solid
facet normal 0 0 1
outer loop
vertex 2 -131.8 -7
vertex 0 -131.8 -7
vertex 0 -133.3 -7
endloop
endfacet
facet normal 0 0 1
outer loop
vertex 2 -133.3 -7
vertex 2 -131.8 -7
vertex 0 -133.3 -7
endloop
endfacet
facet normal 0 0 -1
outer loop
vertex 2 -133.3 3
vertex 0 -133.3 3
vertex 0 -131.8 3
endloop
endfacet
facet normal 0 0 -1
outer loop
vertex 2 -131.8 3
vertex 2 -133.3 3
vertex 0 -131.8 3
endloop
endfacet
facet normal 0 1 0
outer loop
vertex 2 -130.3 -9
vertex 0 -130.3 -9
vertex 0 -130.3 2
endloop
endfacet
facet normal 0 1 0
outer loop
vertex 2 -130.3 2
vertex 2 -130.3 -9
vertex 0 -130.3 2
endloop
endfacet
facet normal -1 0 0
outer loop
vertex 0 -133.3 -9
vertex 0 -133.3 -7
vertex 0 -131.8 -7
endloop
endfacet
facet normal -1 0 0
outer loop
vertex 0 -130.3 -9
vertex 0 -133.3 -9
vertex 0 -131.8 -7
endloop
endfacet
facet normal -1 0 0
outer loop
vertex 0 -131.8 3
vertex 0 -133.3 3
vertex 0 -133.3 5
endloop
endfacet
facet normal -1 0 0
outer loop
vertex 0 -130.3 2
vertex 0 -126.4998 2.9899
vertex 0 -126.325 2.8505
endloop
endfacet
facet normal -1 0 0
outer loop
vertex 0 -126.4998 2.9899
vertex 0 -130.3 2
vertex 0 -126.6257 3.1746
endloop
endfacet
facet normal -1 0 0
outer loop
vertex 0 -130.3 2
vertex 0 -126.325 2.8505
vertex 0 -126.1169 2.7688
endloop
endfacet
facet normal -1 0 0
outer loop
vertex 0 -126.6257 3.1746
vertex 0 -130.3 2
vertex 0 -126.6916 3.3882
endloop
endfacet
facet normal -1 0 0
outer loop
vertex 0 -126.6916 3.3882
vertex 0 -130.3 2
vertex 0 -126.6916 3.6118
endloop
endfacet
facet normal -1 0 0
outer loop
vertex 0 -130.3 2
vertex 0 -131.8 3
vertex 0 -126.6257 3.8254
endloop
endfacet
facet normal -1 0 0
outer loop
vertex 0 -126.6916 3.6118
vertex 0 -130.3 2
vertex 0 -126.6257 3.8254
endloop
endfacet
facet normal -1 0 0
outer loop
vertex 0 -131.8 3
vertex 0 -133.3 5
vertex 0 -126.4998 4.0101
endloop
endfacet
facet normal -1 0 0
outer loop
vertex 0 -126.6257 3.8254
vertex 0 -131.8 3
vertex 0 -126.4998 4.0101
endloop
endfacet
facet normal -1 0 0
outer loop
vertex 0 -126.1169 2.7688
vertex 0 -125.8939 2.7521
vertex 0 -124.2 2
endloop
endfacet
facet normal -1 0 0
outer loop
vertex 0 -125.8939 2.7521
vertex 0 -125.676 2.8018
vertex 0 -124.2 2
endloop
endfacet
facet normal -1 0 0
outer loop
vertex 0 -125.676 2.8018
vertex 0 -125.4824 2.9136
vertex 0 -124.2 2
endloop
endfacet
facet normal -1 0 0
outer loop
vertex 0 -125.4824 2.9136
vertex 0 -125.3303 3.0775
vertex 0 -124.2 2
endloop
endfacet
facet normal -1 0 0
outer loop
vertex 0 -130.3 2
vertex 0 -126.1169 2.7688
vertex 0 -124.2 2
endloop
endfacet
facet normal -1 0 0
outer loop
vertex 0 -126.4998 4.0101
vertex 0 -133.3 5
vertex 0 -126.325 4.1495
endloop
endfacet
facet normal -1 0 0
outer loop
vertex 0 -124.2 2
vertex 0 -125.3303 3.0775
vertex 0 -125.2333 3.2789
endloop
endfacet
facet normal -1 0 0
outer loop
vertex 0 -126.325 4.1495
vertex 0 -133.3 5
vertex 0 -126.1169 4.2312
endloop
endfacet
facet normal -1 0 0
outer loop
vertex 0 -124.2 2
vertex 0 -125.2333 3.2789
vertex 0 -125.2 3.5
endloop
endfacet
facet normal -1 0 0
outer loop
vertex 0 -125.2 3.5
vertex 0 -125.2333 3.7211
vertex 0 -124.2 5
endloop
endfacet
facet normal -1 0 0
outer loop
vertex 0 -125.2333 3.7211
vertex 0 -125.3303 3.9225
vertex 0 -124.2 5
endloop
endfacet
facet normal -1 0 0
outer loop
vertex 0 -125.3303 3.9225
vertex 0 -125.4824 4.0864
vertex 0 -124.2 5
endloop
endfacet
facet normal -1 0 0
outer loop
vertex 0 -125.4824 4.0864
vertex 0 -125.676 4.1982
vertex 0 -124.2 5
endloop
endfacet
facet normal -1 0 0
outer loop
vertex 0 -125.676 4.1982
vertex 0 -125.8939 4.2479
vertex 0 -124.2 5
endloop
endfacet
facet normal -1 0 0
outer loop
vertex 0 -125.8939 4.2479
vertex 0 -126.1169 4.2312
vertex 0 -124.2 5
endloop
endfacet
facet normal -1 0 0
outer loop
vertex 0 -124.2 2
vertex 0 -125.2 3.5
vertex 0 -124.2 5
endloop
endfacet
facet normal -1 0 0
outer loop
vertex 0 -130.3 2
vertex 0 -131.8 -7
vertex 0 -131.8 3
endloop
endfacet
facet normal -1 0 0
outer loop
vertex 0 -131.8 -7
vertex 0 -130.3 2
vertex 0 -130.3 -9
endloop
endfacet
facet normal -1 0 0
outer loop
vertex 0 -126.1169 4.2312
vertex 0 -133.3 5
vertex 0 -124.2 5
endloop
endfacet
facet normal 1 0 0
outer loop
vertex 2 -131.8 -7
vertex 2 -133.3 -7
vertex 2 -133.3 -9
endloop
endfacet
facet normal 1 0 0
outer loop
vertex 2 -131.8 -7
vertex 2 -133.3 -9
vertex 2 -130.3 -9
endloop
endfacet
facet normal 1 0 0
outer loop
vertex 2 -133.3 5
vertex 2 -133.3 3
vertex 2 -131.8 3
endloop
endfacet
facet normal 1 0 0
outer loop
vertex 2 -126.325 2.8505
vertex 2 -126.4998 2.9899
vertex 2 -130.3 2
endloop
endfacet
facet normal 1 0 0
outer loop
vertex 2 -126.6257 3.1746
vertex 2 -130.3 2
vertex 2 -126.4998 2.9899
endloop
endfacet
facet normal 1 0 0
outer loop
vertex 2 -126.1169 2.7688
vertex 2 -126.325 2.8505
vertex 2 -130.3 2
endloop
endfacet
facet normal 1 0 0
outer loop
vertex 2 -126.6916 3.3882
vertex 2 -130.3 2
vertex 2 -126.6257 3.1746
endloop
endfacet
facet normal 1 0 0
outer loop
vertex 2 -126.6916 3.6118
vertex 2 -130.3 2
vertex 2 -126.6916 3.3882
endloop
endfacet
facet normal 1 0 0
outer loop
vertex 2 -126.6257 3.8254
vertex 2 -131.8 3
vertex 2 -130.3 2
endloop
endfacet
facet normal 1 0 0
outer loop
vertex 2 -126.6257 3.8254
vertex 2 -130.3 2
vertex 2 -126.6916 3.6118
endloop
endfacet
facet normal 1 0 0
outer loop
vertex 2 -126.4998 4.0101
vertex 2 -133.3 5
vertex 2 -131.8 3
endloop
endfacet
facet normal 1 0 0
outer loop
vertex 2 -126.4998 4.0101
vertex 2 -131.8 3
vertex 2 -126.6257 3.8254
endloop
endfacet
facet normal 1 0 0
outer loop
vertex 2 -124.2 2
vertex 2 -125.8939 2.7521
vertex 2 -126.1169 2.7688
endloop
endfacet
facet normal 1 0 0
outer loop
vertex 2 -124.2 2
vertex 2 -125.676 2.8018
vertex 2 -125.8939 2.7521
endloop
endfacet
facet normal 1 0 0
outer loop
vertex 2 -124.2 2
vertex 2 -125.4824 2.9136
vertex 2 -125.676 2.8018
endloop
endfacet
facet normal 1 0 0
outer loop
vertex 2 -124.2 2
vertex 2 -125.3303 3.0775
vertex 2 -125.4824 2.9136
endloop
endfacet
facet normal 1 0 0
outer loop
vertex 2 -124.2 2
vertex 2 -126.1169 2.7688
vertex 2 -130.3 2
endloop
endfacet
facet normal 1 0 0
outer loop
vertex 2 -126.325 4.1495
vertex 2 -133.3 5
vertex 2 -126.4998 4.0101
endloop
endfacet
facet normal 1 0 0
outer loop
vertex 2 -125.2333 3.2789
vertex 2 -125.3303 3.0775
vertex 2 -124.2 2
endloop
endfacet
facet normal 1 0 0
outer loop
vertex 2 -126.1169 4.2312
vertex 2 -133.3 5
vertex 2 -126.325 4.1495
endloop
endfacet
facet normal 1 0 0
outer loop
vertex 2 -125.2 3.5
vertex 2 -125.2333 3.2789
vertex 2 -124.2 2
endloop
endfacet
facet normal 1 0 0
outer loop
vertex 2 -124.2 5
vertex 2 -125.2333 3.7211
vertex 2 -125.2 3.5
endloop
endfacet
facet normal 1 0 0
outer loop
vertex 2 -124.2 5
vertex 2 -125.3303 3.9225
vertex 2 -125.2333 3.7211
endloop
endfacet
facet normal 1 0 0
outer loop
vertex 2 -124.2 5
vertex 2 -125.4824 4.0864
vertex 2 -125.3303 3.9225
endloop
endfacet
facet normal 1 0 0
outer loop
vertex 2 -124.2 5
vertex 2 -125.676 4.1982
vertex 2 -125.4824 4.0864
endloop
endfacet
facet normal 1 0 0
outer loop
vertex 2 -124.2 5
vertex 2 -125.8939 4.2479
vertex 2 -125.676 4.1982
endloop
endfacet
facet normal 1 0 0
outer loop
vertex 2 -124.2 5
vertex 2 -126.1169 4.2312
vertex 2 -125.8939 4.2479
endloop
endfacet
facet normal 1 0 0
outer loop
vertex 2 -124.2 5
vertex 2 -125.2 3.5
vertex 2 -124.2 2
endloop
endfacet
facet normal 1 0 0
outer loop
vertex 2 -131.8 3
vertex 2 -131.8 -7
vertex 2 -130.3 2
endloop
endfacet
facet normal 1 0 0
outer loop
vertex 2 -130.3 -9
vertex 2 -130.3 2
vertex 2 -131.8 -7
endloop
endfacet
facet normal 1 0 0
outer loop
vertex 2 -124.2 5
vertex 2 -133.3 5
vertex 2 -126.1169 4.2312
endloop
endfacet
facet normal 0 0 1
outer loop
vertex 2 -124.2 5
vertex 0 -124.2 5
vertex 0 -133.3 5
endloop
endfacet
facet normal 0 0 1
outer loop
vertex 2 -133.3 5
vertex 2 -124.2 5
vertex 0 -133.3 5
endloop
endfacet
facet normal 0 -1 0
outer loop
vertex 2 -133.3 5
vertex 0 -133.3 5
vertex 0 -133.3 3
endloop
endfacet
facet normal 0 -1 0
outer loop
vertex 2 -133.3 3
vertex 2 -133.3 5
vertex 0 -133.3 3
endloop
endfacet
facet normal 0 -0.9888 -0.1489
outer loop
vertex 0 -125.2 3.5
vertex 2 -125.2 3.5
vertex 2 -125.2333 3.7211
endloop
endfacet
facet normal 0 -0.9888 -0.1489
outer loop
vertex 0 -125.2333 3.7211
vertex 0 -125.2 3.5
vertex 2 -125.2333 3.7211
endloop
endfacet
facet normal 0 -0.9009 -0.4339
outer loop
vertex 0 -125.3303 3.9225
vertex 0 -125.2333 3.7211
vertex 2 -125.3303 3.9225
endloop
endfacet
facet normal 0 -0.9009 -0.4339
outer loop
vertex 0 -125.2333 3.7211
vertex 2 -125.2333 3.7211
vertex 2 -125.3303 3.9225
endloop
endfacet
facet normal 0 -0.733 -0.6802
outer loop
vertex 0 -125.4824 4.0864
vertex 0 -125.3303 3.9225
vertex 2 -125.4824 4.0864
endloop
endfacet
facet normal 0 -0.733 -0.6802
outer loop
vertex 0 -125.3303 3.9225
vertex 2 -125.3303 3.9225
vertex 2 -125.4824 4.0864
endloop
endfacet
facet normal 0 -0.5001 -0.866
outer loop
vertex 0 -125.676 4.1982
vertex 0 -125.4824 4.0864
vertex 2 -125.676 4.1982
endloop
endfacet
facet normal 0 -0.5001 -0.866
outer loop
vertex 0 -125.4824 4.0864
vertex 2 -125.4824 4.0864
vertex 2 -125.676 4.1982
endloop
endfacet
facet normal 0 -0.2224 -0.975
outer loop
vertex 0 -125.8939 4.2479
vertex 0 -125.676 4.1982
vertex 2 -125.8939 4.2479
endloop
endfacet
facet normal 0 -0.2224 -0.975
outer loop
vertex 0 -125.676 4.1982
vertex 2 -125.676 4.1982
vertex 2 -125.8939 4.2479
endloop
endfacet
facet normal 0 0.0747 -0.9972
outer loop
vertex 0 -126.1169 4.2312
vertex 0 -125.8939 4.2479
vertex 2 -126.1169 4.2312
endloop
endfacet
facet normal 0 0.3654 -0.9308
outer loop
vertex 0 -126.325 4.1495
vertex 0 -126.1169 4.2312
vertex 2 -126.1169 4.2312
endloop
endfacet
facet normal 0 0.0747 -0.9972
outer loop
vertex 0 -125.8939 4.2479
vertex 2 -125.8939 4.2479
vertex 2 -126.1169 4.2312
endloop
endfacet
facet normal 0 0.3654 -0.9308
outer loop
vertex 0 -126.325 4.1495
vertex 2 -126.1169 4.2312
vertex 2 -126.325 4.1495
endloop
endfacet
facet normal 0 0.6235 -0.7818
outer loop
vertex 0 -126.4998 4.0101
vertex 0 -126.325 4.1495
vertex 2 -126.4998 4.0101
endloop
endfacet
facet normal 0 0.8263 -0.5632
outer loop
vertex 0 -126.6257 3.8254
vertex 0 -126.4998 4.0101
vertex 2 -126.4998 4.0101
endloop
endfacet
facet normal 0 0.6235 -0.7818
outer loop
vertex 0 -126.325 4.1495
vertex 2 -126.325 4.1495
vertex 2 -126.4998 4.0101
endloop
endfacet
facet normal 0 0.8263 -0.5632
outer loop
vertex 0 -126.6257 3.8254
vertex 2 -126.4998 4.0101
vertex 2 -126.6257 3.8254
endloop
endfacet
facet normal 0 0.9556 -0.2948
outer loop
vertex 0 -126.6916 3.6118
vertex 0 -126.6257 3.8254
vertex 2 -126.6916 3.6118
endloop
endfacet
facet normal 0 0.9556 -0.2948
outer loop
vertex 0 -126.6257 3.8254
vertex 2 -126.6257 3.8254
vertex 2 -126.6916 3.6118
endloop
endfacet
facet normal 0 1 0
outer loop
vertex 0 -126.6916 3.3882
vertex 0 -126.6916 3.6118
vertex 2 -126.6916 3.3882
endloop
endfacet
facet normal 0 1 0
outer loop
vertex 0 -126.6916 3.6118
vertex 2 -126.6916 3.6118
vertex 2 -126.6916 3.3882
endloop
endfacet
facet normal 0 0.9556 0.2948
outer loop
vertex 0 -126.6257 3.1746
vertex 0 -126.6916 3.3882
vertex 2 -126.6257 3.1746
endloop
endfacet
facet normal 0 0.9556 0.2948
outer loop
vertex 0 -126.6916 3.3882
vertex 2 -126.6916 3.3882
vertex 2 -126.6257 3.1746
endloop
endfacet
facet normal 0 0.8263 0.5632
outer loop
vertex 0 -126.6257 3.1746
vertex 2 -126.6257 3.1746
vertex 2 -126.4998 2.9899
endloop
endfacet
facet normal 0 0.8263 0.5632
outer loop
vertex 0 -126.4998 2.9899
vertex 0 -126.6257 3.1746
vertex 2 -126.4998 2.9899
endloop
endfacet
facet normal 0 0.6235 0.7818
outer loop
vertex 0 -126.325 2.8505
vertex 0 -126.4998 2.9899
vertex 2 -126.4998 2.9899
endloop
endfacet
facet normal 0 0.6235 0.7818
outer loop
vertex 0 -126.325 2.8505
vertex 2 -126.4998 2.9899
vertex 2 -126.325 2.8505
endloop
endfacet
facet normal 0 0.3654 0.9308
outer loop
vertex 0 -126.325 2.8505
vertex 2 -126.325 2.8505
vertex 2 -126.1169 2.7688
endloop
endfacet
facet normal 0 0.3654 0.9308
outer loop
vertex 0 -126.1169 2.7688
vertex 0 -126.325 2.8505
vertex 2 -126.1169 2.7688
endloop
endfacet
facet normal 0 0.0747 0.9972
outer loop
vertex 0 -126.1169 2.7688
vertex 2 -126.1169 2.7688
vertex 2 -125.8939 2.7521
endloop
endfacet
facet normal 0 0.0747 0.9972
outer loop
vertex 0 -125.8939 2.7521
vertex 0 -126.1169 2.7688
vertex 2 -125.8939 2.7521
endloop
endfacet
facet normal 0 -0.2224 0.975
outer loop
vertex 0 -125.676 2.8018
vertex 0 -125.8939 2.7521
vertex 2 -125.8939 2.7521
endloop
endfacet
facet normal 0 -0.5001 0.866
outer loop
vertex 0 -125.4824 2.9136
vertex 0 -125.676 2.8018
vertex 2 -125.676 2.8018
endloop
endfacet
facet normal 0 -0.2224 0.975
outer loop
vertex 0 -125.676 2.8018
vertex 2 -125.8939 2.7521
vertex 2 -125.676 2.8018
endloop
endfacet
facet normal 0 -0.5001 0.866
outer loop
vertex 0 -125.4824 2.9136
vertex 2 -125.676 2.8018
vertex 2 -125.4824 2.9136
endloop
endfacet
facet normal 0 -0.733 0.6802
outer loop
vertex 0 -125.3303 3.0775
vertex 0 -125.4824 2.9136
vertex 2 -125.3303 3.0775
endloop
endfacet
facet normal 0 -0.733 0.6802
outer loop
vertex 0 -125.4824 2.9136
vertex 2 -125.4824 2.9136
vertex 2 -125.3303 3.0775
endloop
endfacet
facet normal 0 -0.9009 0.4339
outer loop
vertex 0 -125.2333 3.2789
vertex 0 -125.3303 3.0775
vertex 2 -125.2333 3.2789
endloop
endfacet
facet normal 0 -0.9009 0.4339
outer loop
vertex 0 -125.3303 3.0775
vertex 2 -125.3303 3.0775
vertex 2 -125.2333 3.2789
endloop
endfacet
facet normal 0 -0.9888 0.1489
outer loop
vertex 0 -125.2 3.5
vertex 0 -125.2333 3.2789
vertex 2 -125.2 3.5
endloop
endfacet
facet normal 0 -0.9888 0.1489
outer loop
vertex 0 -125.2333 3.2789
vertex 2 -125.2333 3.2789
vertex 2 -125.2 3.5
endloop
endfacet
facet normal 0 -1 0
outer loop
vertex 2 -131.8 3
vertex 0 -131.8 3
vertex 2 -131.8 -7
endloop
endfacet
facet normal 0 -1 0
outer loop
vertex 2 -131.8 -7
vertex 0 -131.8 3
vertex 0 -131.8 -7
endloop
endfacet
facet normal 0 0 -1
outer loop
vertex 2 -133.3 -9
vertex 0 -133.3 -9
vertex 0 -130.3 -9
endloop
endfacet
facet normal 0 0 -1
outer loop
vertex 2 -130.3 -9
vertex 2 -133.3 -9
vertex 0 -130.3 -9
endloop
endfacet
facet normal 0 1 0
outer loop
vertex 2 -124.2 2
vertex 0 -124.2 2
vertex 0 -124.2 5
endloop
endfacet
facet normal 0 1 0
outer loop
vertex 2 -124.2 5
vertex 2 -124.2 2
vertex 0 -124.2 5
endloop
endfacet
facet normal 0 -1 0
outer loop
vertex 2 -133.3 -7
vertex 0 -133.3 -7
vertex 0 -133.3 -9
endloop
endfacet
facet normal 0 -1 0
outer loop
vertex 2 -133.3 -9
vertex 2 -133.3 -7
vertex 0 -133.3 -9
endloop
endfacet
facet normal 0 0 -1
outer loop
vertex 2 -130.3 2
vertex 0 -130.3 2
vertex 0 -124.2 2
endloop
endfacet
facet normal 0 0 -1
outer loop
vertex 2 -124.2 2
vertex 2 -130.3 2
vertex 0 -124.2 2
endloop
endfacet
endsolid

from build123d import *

# Parameters (mm, degrees)
EXTRUDE041_DEPTH = 2
SKETCH113_R      = 0.75
HOLE025_DEPTH    = 2
HOLE025_TIPS_R   = 0.75


with BuildPart() as part:
    # Sketch090 → Extrude041 (new body)
    with BuildSketch(Plane.YZ):
        Polygon((-128.000002, 5), (-130.000002, 5), (-130.300002, 5), (-133.300002, 5), (-133.300002, 3), (-131.800002, 3), (-131.800002, -7), (-133.300002, -7), (-133.300002, -9), (-130.300002, -9), (-130.300002, 2), (-130.000002, 2), (-128.000002, 2), (-127.700002, 2), (-124.200002, 2), (-124.200002, 5), (-127.700002, 5), align=None)
    extrude(amount=EXTRUDE041_DEPTH)

    # Sketch113 (on Face19 of Extrude041) → Hole025 (cut)
    with BuildSketch(Plane.YZ.offset(2)):
        with Locations((-125.949997, 3.5)):
            Circle(SKETCH113_R)
    extrude(amount=-HOLE025_DEPTH, mode=Mode.SUBTRACT)

    # Hole025 tips → Hole025 tip 1 section 0
    with BuildSketch(Plane.YZ, mode=Mode.PRIVATE) as hole025_tip_1_s0:
        with Locations((-125.949997, 3.5)):
            Circle(HOLE025_TIPS_R)
    loft([hole025_tip_1_s0.sketch, Vertex(-0.450645, -125.949997, 3.5)], mode=Mode.SUBTRACT)


solid = part.part
